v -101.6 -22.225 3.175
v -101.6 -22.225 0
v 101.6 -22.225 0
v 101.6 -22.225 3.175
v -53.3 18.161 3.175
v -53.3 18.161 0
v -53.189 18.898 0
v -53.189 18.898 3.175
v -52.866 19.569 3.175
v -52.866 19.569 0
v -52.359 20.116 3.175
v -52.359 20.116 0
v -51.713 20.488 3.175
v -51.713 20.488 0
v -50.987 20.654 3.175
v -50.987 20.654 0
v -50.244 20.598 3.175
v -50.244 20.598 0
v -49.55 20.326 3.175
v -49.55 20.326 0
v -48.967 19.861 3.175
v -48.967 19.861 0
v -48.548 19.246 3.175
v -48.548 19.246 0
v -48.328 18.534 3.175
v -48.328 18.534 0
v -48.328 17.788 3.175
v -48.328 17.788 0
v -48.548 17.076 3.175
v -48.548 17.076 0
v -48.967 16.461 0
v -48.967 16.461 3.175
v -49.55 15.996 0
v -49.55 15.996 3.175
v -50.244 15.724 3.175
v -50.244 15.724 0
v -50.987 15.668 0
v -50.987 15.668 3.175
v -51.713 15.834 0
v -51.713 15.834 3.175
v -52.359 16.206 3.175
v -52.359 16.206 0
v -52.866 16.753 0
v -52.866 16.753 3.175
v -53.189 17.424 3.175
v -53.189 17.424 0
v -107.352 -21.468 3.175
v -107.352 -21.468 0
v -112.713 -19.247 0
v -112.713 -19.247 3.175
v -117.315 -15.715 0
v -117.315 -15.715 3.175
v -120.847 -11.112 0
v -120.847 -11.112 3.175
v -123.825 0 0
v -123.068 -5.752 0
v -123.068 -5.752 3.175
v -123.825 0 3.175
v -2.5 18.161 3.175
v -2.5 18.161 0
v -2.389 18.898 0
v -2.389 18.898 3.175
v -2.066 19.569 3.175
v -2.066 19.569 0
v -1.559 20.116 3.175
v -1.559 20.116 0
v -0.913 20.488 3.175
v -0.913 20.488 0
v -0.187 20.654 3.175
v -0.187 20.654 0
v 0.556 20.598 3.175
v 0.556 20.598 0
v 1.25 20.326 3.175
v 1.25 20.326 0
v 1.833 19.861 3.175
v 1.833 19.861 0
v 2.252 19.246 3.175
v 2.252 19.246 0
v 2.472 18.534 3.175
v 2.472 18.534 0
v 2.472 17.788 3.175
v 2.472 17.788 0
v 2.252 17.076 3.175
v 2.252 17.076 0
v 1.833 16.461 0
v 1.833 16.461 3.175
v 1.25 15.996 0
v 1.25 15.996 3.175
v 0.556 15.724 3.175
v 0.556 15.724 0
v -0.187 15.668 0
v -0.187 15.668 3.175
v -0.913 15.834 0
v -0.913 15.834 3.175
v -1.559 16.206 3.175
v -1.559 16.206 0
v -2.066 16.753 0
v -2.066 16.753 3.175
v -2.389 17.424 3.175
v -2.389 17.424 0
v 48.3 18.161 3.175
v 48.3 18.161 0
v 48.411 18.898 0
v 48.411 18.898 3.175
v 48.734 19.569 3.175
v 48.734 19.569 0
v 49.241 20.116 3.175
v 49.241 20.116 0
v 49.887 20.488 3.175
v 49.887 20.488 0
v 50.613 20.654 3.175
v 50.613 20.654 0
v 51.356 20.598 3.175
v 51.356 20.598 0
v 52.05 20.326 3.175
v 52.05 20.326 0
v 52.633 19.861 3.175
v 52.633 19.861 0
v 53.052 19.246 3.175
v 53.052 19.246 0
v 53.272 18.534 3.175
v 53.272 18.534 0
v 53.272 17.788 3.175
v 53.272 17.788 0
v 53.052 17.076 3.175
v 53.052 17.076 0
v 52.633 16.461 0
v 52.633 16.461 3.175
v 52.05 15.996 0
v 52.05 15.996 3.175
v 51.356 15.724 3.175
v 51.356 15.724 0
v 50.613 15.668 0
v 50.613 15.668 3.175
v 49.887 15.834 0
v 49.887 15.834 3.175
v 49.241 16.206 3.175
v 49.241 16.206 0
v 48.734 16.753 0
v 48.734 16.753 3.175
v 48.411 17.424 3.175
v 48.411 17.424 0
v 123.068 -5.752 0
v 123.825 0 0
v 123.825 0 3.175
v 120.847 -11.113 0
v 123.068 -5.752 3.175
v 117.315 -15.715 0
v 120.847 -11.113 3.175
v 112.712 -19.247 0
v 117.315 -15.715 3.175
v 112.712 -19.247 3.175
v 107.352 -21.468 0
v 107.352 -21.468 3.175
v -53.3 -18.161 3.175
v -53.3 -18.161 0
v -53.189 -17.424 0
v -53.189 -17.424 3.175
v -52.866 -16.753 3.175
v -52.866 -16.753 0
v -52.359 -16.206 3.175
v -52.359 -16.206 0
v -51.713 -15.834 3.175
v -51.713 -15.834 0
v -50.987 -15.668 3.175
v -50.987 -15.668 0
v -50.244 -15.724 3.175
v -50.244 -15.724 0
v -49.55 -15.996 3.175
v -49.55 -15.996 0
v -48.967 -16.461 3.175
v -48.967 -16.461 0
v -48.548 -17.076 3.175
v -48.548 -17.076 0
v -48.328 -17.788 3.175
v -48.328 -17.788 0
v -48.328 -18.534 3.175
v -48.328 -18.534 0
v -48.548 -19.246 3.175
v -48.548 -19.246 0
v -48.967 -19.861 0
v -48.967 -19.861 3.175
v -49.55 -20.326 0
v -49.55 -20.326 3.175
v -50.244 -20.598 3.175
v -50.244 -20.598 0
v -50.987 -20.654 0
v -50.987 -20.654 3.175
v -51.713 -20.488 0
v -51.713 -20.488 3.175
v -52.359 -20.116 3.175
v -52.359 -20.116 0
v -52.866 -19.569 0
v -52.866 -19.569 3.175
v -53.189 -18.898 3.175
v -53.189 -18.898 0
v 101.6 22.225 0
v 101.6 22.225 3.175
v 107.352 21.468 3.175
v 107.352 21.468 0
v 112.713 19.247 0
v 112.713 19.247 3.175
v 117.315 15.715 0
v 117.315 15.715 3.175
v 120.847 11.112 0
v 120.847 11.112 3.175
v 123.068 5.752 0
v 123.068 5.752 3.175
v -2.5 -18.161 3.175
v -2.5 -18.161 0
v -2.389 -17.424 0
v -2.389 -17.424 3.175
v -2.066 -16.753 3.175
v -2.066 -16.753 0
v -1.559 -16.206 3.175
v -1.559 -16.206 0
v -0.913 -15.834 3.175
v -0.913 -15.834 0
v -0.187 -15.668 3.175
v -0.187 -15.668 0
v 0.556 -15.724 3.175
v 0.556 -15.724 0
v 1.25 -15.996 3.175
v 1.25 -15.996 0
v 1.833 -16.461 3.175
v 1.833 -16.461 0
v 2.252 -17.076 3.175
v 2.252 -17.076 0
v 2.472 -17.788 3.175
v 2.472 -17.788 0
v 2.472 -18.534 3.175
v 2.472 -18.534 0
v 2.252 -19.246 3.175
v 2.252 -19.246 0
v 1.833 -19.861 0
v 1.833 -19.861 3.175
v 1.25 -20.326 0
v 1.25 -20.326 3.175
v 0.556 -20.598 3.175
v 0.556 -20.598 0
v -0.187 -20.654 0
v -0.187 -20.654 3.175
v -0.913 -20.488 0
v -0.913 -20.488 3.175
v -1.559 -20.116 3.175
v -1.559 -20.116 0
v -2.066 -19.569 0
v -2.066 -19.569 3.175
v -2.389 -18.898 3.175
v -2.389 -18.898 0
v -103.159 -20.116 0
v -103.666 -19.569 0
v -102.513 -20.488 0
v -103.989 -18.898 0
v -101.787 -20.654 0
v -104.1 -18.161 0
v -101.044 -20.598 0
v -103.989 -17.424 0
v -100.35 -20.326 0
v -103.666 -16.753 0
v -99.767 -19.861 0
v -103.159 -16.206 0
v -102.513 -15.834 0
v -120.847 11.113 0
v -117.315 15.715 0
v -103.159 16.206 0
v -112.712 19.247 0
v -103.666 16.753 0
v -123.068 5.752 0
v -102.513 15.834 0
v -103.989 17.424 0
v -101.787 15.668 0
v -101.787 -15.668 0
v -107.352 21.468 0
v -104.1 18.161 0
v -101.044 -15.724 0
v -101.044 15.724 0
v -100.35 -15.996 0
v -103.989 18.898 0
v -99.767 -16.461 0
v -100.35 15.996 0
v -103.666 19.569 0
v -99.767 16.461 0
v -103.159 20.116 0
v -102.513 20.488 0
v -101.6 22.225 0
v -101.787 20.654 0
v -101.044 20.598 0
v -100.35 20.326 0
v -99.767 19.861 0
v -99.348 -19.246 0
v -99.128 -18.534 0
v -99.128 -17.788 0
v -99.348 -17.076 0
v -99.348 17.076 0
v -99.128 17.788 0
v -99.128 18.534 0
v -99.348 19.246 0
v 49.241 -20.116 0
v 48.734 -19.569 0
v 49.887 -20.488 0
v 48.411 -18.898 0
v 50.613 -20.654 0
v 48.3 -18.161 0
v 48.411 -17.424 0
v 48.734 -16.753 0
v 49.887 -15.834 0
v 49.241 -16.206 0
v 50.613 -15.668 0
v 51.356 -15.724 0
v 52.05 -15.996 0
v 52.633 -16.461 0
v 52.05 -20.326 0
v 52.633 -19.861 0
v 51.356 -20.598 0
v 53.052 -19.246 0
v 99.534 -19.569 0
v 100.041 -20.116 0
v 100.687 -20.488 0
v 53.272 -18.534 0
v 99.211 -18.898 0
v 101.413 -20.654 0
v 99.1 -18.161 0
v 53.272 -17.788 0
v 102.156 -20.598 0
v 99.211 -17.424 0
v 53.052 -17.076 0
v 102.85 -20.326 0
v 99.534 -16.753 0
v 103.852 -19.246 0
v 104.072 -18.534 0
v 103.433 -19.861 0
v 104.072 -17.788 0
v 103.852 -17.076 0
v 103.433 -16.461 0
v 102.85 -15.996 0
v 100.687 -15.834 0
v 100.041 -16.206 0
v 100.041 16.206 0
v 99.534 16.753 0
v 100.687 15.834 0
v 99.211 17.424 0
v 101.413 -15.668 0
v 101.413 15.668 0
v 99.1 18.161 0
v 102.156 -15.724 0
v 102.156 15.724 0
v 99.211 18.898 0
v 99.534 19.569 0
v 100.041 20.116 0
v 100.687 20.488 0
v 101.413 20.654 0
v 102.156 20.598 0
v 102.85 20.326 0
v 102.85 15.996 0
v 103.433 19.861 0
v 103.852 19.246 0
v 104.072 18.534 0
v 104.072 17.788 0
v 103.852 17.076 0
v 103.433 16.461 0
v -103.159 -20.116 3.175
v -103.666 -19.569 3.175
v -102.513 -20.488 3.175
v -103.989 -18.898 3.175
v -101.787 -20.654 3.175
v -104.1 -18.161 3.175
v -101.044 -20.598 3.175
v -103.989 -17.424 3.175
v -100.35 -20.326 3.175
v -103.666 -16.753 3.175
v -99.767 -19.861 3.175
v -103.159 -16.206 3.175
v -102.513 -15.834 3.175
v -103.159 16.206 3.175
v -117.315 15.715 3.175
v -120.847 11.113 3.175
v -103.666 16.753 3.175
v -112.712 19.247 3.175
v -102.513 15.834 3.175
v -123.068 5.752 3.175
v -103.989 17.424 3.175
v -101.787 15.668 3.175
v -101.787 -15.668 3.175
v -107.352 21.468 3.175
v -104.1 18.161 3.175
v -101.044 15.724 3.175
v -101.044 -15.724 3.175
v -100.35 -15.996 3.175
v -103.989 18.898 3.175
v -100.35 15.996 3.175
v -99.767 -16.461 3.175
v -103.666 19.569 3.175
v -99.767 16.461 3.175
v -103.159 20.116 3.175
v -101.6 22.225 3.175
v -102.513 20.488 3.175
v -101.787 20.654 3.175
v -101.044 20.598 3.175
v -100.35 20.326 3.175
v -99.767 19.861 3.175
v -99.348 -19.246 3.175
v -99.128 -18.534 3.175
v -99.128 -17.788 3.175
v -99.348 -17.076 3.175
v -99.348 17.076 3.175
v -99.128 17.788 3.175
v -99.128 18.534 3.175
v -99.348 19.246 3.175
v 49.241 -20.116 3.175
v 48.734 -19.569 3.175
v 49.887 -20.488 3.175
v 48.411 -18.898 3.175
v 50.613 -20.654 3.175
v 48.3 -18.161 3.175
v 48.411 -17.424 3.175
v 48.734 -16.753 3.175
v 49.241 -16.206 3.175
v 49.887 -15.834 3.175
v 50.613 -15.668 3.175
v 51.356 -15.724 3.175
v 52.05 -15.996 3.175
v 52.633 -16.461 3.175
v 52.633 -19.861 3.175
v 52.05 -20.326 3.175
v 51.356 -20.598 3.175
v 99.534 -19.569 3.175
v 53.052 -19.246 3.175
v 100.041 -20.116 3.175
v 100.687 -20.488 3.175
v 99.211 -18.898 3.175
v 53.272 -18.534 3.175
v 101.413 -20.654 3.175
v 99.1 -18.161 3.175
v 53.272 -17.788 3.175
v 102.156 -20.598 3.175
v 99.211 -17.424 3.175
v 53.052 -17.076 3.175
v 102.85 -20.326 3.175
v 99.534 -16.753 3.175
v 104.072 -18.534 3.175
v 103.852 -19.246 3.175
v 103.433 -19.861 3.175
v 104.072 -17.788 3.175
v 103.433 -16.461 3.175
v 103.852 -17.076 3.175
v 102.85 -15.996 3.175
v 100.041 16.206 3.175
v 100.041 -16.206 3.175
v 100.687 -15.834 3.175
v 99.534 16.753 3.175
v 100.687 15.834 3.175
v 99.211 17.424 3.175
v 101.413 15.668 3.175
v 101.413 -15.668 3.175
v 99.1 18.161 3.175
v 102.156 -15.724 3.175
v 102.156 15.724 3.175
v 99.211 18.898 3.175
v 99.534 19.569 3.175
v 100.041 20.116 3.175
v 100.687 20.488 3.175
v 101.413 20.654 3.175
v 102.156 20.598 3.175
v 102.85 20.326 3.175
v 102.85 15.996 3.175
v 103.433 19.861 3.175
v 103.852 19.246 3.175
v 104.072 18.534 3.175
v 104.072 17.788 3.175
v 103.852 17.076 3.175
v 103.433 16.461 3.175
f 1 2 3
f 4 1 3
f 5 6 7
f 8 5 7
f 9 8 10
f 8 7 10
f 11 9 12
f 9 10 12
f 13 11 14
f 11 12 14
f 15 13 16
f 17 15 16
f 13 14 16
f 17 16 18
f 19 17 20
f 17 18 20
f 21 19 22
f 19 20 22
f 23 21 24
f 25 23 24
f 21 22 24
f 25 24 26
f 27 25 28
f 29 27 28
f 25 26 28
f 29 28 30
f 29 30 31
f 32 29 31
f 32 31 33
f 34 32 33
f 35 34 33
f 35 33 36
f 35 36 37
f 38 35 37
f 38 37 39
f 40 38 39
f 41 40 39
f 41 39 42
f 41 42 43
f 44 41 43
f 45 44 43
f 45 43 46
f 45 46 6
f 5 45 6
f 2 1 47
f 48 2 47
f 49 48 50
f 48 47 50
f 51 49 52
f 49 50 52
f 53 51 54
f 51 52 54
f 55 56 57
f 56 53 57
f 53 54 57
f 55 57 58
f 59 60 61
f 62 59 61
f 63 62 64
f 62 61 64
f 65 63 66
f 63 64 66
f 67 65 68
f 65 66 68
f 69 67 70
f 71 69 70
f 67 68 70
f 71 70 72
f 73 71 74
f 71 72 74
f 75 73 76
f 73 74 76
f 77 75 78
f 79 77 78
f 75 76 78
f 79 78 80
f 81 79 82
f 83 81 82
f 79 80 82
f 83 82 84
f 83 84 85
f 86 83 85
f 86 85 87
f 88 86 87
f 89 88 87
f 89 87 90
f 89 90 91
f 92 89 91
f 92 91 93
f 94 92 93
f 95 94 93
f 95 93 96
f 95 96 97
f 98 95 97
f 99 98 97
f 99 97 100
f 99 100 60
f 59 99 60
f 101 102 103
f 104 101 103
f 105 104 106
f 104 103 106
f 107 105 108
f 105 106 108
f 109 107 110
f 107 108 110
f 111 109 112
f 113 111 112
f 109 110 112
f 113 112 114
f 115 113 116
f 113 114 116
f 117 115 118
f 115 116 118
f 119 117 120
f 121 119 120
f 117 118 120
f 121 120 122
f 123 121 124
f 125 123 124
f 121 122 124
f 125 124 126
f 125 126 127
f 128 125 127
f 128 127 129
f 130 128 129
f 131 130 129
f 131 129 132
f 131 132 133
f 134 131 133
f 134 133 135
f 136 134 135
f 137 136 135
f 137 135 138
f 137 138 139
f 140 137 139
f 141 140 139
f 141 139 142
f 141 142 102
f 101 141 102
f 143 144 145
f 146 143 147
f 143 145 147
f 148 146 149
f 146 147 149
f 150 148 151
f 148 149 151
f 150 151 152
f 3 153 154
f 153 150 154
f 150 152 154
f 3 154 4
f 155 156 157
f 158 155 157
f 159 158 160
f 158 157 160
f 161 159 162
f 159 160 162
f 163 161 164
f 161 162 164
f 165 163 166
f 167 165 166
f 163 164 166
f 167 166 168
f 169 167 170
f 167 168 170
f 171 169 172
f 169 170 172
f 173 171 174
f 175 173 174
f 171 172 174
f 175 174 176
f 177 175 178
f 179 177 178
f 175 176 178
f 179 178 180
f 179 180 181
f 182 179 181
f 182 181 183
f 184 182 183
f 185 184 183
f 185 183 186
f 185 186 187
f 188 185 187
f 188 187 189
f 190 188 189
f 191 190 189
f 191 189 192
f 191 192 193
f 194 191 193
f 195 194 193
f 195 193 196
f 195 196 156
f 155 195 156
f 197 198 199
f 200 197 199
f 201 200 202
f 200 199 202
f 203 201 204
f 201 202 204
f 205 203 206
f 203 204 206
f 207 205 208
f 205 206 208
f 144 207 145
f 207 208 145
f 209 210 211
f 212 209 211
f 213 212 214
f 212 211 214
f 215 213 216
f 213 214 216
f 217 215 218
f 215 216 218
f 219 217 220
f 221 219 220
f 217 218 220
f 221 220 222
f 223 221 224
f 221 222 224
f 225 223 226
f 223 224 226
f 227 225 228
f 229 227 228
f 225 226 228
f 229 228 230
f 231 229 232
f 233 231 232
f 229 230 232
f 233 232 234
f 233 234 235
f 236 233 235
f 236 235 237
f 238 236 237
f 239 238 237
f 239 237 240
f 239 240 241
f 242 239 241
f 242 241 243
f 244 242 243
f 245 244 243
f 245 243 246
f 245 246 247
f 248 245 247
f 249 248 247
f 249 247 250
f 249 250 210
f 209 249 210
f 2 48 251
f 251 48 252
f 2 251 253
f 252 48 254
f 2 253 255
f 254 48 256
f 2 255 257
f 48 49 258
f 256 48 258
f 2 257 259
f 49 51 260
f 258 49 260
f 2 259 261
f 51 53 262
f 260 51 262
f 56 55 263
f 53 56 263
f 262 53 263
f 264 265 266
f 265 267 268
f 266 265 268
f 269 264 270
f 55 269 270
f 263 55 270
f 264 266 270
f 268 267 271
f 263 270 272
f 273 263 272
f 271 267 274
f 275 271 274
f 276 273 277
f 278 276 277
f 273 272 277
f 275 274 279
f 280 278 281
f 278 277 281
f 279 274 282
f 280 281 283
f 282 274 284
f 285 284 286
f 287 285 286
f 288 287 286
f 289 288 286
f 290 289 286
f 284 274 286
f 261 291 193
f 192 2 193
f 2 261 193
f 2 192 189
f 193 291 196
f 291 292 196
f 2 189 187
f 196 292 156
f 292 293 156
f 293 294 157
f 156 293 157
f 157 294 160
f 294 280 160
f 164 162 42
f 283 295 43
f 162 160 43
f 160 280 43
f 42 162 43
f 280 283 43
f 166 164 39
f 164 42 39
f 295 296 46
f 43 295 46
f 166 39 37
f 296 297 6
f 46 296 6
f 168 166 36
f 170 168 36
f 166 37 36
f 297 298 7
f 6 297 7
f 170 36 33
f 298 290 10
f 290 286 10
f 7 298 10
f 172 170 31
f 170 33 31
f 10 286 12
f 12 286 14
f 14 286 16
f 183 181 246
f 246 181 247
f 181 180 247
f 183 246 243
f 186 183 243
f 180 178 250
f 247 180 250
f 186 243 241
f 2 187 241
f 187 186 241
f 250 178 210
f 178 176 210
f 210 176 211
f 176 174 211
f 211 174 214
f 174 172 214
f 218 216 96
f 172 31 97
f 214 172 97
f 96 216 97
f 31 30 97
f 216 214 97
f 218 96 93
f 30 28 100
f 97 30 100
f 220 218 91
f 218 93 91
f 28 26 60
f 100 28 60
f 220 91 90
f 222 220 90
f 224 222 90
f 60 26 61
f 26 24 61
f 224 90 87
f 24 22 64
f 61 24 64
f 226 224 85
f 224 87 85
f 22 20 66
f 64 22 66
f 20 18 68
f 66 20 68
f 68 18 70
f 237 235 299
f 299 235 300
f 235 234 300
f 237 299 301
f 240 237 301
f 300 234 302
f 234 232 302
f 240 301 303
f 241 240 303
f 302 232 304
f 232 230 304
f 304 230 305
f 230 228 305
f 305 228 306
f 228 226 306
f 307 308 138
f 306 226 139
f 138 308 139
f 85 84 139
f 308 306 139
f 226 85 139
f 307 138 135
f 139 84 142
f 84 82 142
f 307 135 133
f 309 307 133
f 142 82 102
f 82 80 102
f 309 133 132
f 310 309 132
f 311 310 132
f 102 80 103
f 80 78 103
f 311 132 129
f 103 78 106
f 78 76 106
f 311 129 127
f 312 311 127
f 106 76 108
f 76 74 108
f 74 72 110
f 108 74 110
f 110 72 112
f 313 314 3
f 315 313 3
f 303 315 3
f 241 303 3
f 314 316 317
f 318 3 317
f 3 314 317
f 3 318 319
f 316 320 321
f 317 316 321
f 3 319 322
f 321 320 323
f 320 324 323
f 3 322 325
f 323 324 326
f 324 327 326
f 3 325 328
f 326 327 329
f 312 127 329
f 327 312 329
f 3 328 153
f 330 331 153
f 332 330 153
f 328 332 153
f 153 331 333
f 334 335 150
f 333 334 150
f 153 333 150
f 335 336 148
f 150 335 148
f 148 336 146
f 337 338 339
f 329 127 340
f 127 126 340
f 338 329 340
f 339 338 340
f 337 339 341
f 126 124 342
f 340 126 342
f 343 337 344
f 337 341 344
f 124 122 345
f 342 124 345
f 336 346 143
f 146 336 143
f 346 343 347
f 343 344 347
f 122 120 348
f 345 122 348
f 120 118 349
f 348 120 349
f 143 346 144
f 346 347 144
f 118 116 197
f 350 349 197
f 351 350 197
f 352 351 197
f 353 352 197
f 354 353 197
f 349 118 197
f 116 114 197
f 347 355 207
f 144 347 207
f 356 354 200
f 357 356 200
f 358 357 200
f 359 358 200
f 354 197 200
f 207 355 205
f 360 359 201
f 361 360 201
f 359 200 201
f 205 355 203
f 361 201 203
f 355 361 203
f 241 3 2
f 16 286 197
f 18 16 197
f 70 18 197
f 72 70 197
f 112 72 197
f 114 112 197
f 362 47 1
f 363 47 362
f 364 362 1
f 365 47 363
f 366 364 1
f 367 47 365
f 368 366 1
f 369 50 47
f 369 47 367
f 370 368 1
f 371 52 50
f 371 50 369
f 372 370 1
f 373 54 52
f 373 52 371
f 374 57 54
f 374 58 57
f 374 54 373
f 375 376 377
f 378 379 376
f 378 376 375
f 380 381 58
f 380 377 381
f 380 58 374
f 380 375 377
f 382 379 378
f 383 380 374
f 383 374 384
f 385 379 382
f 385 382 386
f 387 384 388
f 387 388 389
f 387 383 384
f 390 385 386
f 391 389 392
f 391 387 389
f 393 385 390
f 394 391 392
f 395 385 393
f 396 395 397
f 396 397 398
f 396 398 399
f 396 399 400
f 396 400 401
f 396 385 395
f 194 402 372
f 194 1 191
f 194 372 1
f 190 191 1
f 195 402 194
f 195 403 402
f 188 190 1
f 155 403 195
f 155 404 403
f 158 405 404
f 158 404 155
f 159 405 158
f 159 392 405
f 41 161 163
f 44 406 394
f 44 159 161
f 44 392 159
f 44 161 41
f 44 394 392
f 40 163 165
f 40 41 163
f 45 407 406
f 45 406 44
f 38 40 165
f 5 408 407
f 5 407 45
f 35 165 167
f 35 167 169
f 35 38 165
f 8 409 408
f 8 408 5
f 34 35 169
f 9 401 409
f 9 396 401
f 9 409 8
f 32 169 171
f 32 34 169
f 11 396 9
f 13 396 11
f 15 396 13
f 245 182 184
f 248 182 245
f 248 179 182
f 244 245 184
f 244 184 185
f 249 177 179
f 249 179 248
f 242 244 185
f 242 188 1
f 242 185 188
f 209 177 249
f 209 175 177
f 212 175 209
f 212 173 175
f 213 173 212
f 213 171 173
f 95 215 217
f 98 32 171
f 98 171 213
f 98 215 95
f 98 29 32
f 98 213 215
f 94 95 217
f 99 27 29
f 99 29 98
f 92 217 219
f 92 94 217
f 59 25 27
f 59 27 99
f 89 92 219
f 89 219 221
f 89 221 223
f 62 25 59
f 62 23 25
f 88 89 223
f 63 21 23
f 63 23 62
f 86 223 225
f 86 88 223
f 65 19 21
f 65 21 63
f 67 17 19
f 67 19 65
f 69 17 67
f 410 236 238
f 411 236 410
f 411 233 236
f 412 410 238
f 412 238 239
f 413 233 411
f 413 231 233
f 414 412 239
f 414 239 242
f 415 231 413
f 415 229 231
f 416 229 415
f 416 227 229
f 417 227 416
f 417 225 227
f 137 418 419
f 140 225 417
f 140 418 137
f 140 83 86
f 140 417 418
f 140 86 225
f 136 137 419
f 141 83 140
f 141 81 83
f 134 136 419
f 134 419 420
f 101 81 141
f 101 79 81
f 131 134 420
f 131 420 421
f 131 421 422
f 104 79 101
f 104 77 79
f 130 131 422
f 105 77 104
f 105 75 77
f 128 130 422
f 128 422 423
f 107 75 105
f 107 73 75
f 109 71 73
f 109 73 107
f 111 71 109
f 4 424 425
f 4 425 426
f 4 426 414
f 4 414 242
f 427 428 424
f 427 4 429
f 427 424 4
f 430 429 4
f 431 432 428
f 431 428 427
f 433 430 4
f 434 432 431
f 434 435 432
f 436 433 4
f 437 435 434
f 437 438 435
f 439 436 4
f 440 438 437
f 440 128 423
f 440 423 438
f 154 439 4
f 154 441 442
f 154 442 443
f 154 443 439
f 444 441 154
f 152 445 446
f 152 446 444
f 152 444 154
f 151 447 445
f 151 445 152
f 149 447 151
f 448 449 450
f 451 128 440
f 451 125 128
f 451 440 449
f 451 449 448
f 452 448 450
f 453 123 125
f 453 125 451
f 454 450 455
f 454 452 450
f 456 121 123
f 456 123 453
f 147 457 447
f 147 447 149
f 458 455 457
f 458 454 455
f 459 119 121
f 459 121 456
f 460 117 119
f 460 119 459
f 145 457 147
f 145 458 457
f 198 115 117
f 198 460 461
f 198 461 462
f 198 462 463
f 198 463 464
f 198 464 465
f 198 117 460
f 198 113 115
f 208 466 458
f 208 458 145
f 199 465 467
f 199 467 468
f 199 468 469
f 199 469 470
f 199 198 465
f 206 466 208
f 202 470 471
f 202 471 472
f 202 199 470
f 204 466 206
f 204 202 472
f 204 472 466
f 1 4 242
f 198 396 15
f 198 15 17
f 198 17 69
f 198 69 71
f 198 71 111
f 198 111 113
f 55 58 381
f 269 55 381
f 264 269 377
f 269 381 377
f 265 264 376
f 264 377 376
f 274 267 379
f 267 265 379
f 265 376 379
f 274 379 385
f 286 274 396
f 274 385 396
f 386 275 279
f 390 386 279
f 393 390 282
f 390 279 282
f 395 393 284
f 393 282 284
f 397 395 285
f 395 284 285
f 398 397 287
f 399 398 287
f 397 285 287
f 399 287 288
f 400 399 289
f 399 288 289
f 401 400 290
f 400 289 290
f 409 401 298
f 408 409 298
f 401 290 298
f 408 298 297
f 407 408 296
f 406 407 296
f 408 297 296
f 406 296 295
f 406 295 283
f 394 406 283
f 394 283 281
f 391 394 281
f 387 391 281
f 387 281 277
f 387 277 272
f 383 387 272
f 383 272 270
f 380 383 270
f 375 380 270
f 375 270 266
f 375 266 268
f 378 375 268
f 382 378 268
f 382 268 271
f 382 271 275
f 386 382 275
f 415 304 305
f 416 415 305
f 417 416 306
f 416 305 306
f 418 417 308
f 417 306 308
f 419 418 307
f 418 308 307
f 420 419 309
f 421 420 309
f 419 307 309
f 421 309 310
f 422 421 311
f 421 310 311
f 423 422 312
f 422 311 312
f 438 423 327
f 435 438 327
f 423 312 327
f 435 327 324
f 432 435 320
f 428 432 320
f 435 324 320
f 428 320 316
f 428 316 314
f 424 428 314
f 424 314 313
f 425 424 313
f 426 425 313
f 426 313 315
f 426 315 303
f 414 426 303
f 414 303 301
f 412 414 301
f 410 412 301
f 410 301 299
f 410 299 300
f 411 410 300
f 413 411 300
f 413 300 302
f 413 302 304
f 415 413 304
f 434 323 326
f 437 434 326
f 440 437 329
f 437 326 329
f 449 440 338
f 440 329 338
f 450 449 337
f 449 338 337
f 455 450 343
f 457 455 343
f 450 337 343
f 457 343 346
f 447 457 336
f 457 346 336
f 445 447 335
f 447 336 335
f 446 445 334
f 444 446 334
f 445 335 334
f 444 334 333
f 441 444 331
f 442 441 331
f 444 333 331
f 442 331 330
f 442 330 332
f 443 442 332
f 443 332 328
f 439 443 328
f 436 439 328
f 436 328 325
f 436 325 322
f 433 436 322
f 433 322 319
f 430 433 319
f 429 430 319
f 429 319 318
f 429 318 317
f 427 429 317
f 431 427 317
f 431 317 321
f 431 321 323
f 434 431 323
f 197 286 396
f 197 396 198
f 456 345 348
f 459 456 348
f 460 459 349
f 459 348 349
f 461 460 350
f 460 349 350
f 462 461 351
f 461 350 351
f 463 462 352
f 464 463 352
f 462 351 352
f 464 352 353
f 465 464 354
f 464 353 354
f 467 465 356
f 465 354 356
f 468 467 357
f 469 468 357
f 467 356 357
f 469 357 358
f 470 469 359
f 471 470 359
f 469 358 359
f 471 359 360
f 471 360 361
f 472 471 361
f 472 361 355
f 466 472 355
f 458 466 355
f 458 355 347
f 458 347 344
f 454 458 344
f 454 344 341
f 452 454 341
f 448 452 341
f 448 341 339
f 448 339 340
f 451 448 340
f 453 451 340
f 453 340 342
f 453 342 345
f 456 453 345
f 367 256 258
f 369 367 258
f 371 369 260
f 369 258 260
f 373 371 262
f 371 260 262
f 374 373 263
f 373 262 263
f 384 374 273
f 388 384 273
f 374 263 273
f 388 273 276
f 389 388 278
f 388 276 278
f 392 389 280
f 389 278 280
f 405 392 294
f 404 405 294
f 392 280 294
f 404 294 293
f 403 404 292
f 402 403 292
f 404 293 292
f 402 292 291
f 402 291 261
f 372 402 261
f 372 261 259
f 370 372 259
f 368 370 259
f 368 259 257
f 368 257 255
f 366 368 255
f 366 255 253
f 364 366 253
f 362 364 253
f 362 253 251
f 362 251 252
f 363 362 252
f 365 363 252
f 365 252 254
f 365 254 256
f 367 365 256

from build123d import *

# Parameters (mm, degrees)
SKETCH1_W                    = 247.65
SKETCH1_H                    = 44.45
BOSS_EXTRUDE1_DEPTH          = 3.175
CUT_EXTRUDE1_DEPTH           = 126.84379951
F_10_0_1935_DIAMETER_HOLE1_D = 4.999999906


with BuildPart() as part:
    # Sketch1 → Boss-Extrude1 (new body)
    with BuildSketch(Plane.XY):
        Rectangle(SKETCH1_W, SKETCH1_H)
    extrude(amount=BOSS_EXTRUDE1_DEPTH)

    # Sketch2 → Cut-Extrude1 (cut, through all)
    with BuildSketch(Plane.XY.offset(3.175)):
        with BuildLine():
            Line((-123.825, 22.225), (-123.825, 5e-09))
            ThreePointArc((-123.825, 5e-09), (-117.31544821, 15.715448214), (-101.6, 22.225))
            Line((-101.6, 22.225), (-123.825, 22.225))
        make_face()
        with BuildLine():
            Line((-123.825, -22.225), (-101.6, -22.225))
            ThreePointArc((-101.6, -22.225), (-117.315448214, -15.71544821), (-123.825, 5e-09))
            Line((-123.825, 5e-09), (-123.825, -22.225))
        make_face()
        with BuildLine():
            ThreePointArc((123.825, -6.4e-08), (117.315448189, -15.715448235), (101.6, -22.225))
            Line((101.6, -22.225), (123.825, -22.225))
            Line((123.825, -22.225), (123.825, -6.4e-08))
        make_face()
        with BuildLine():
            ThreePointArc((101.6, 22.225), (117.315448235, 15.715448189), (123.825, -6.4e-08))
            Line((123.825, -6.4e-08), (123.825, 22.225))
            Line((123.825, 22.225), (101.6, 22.225))
        make_face()
    extrude(amount=-CUT_EXTRUDE1_DEPTH, mode=Mode.SUBTRACT)

    # #10 (0.1935) Diameter Hole1 (through all)
    with Locations(Plane.XY.offset(3.175)):
        with Locations((-101.6, 18.161), (-50.8, 18.161), (0, 18.161), (50.8, 18.161), (101.6, 18.161), (101.6, -18.161), (50.8, -18.161), (0, -18.161), (-50.8, -18.161), (-101.6, -18.161)):
            Hole(F_10_0_1935_DIAMETER_HOLE1_D / 2)


solid = part.part
